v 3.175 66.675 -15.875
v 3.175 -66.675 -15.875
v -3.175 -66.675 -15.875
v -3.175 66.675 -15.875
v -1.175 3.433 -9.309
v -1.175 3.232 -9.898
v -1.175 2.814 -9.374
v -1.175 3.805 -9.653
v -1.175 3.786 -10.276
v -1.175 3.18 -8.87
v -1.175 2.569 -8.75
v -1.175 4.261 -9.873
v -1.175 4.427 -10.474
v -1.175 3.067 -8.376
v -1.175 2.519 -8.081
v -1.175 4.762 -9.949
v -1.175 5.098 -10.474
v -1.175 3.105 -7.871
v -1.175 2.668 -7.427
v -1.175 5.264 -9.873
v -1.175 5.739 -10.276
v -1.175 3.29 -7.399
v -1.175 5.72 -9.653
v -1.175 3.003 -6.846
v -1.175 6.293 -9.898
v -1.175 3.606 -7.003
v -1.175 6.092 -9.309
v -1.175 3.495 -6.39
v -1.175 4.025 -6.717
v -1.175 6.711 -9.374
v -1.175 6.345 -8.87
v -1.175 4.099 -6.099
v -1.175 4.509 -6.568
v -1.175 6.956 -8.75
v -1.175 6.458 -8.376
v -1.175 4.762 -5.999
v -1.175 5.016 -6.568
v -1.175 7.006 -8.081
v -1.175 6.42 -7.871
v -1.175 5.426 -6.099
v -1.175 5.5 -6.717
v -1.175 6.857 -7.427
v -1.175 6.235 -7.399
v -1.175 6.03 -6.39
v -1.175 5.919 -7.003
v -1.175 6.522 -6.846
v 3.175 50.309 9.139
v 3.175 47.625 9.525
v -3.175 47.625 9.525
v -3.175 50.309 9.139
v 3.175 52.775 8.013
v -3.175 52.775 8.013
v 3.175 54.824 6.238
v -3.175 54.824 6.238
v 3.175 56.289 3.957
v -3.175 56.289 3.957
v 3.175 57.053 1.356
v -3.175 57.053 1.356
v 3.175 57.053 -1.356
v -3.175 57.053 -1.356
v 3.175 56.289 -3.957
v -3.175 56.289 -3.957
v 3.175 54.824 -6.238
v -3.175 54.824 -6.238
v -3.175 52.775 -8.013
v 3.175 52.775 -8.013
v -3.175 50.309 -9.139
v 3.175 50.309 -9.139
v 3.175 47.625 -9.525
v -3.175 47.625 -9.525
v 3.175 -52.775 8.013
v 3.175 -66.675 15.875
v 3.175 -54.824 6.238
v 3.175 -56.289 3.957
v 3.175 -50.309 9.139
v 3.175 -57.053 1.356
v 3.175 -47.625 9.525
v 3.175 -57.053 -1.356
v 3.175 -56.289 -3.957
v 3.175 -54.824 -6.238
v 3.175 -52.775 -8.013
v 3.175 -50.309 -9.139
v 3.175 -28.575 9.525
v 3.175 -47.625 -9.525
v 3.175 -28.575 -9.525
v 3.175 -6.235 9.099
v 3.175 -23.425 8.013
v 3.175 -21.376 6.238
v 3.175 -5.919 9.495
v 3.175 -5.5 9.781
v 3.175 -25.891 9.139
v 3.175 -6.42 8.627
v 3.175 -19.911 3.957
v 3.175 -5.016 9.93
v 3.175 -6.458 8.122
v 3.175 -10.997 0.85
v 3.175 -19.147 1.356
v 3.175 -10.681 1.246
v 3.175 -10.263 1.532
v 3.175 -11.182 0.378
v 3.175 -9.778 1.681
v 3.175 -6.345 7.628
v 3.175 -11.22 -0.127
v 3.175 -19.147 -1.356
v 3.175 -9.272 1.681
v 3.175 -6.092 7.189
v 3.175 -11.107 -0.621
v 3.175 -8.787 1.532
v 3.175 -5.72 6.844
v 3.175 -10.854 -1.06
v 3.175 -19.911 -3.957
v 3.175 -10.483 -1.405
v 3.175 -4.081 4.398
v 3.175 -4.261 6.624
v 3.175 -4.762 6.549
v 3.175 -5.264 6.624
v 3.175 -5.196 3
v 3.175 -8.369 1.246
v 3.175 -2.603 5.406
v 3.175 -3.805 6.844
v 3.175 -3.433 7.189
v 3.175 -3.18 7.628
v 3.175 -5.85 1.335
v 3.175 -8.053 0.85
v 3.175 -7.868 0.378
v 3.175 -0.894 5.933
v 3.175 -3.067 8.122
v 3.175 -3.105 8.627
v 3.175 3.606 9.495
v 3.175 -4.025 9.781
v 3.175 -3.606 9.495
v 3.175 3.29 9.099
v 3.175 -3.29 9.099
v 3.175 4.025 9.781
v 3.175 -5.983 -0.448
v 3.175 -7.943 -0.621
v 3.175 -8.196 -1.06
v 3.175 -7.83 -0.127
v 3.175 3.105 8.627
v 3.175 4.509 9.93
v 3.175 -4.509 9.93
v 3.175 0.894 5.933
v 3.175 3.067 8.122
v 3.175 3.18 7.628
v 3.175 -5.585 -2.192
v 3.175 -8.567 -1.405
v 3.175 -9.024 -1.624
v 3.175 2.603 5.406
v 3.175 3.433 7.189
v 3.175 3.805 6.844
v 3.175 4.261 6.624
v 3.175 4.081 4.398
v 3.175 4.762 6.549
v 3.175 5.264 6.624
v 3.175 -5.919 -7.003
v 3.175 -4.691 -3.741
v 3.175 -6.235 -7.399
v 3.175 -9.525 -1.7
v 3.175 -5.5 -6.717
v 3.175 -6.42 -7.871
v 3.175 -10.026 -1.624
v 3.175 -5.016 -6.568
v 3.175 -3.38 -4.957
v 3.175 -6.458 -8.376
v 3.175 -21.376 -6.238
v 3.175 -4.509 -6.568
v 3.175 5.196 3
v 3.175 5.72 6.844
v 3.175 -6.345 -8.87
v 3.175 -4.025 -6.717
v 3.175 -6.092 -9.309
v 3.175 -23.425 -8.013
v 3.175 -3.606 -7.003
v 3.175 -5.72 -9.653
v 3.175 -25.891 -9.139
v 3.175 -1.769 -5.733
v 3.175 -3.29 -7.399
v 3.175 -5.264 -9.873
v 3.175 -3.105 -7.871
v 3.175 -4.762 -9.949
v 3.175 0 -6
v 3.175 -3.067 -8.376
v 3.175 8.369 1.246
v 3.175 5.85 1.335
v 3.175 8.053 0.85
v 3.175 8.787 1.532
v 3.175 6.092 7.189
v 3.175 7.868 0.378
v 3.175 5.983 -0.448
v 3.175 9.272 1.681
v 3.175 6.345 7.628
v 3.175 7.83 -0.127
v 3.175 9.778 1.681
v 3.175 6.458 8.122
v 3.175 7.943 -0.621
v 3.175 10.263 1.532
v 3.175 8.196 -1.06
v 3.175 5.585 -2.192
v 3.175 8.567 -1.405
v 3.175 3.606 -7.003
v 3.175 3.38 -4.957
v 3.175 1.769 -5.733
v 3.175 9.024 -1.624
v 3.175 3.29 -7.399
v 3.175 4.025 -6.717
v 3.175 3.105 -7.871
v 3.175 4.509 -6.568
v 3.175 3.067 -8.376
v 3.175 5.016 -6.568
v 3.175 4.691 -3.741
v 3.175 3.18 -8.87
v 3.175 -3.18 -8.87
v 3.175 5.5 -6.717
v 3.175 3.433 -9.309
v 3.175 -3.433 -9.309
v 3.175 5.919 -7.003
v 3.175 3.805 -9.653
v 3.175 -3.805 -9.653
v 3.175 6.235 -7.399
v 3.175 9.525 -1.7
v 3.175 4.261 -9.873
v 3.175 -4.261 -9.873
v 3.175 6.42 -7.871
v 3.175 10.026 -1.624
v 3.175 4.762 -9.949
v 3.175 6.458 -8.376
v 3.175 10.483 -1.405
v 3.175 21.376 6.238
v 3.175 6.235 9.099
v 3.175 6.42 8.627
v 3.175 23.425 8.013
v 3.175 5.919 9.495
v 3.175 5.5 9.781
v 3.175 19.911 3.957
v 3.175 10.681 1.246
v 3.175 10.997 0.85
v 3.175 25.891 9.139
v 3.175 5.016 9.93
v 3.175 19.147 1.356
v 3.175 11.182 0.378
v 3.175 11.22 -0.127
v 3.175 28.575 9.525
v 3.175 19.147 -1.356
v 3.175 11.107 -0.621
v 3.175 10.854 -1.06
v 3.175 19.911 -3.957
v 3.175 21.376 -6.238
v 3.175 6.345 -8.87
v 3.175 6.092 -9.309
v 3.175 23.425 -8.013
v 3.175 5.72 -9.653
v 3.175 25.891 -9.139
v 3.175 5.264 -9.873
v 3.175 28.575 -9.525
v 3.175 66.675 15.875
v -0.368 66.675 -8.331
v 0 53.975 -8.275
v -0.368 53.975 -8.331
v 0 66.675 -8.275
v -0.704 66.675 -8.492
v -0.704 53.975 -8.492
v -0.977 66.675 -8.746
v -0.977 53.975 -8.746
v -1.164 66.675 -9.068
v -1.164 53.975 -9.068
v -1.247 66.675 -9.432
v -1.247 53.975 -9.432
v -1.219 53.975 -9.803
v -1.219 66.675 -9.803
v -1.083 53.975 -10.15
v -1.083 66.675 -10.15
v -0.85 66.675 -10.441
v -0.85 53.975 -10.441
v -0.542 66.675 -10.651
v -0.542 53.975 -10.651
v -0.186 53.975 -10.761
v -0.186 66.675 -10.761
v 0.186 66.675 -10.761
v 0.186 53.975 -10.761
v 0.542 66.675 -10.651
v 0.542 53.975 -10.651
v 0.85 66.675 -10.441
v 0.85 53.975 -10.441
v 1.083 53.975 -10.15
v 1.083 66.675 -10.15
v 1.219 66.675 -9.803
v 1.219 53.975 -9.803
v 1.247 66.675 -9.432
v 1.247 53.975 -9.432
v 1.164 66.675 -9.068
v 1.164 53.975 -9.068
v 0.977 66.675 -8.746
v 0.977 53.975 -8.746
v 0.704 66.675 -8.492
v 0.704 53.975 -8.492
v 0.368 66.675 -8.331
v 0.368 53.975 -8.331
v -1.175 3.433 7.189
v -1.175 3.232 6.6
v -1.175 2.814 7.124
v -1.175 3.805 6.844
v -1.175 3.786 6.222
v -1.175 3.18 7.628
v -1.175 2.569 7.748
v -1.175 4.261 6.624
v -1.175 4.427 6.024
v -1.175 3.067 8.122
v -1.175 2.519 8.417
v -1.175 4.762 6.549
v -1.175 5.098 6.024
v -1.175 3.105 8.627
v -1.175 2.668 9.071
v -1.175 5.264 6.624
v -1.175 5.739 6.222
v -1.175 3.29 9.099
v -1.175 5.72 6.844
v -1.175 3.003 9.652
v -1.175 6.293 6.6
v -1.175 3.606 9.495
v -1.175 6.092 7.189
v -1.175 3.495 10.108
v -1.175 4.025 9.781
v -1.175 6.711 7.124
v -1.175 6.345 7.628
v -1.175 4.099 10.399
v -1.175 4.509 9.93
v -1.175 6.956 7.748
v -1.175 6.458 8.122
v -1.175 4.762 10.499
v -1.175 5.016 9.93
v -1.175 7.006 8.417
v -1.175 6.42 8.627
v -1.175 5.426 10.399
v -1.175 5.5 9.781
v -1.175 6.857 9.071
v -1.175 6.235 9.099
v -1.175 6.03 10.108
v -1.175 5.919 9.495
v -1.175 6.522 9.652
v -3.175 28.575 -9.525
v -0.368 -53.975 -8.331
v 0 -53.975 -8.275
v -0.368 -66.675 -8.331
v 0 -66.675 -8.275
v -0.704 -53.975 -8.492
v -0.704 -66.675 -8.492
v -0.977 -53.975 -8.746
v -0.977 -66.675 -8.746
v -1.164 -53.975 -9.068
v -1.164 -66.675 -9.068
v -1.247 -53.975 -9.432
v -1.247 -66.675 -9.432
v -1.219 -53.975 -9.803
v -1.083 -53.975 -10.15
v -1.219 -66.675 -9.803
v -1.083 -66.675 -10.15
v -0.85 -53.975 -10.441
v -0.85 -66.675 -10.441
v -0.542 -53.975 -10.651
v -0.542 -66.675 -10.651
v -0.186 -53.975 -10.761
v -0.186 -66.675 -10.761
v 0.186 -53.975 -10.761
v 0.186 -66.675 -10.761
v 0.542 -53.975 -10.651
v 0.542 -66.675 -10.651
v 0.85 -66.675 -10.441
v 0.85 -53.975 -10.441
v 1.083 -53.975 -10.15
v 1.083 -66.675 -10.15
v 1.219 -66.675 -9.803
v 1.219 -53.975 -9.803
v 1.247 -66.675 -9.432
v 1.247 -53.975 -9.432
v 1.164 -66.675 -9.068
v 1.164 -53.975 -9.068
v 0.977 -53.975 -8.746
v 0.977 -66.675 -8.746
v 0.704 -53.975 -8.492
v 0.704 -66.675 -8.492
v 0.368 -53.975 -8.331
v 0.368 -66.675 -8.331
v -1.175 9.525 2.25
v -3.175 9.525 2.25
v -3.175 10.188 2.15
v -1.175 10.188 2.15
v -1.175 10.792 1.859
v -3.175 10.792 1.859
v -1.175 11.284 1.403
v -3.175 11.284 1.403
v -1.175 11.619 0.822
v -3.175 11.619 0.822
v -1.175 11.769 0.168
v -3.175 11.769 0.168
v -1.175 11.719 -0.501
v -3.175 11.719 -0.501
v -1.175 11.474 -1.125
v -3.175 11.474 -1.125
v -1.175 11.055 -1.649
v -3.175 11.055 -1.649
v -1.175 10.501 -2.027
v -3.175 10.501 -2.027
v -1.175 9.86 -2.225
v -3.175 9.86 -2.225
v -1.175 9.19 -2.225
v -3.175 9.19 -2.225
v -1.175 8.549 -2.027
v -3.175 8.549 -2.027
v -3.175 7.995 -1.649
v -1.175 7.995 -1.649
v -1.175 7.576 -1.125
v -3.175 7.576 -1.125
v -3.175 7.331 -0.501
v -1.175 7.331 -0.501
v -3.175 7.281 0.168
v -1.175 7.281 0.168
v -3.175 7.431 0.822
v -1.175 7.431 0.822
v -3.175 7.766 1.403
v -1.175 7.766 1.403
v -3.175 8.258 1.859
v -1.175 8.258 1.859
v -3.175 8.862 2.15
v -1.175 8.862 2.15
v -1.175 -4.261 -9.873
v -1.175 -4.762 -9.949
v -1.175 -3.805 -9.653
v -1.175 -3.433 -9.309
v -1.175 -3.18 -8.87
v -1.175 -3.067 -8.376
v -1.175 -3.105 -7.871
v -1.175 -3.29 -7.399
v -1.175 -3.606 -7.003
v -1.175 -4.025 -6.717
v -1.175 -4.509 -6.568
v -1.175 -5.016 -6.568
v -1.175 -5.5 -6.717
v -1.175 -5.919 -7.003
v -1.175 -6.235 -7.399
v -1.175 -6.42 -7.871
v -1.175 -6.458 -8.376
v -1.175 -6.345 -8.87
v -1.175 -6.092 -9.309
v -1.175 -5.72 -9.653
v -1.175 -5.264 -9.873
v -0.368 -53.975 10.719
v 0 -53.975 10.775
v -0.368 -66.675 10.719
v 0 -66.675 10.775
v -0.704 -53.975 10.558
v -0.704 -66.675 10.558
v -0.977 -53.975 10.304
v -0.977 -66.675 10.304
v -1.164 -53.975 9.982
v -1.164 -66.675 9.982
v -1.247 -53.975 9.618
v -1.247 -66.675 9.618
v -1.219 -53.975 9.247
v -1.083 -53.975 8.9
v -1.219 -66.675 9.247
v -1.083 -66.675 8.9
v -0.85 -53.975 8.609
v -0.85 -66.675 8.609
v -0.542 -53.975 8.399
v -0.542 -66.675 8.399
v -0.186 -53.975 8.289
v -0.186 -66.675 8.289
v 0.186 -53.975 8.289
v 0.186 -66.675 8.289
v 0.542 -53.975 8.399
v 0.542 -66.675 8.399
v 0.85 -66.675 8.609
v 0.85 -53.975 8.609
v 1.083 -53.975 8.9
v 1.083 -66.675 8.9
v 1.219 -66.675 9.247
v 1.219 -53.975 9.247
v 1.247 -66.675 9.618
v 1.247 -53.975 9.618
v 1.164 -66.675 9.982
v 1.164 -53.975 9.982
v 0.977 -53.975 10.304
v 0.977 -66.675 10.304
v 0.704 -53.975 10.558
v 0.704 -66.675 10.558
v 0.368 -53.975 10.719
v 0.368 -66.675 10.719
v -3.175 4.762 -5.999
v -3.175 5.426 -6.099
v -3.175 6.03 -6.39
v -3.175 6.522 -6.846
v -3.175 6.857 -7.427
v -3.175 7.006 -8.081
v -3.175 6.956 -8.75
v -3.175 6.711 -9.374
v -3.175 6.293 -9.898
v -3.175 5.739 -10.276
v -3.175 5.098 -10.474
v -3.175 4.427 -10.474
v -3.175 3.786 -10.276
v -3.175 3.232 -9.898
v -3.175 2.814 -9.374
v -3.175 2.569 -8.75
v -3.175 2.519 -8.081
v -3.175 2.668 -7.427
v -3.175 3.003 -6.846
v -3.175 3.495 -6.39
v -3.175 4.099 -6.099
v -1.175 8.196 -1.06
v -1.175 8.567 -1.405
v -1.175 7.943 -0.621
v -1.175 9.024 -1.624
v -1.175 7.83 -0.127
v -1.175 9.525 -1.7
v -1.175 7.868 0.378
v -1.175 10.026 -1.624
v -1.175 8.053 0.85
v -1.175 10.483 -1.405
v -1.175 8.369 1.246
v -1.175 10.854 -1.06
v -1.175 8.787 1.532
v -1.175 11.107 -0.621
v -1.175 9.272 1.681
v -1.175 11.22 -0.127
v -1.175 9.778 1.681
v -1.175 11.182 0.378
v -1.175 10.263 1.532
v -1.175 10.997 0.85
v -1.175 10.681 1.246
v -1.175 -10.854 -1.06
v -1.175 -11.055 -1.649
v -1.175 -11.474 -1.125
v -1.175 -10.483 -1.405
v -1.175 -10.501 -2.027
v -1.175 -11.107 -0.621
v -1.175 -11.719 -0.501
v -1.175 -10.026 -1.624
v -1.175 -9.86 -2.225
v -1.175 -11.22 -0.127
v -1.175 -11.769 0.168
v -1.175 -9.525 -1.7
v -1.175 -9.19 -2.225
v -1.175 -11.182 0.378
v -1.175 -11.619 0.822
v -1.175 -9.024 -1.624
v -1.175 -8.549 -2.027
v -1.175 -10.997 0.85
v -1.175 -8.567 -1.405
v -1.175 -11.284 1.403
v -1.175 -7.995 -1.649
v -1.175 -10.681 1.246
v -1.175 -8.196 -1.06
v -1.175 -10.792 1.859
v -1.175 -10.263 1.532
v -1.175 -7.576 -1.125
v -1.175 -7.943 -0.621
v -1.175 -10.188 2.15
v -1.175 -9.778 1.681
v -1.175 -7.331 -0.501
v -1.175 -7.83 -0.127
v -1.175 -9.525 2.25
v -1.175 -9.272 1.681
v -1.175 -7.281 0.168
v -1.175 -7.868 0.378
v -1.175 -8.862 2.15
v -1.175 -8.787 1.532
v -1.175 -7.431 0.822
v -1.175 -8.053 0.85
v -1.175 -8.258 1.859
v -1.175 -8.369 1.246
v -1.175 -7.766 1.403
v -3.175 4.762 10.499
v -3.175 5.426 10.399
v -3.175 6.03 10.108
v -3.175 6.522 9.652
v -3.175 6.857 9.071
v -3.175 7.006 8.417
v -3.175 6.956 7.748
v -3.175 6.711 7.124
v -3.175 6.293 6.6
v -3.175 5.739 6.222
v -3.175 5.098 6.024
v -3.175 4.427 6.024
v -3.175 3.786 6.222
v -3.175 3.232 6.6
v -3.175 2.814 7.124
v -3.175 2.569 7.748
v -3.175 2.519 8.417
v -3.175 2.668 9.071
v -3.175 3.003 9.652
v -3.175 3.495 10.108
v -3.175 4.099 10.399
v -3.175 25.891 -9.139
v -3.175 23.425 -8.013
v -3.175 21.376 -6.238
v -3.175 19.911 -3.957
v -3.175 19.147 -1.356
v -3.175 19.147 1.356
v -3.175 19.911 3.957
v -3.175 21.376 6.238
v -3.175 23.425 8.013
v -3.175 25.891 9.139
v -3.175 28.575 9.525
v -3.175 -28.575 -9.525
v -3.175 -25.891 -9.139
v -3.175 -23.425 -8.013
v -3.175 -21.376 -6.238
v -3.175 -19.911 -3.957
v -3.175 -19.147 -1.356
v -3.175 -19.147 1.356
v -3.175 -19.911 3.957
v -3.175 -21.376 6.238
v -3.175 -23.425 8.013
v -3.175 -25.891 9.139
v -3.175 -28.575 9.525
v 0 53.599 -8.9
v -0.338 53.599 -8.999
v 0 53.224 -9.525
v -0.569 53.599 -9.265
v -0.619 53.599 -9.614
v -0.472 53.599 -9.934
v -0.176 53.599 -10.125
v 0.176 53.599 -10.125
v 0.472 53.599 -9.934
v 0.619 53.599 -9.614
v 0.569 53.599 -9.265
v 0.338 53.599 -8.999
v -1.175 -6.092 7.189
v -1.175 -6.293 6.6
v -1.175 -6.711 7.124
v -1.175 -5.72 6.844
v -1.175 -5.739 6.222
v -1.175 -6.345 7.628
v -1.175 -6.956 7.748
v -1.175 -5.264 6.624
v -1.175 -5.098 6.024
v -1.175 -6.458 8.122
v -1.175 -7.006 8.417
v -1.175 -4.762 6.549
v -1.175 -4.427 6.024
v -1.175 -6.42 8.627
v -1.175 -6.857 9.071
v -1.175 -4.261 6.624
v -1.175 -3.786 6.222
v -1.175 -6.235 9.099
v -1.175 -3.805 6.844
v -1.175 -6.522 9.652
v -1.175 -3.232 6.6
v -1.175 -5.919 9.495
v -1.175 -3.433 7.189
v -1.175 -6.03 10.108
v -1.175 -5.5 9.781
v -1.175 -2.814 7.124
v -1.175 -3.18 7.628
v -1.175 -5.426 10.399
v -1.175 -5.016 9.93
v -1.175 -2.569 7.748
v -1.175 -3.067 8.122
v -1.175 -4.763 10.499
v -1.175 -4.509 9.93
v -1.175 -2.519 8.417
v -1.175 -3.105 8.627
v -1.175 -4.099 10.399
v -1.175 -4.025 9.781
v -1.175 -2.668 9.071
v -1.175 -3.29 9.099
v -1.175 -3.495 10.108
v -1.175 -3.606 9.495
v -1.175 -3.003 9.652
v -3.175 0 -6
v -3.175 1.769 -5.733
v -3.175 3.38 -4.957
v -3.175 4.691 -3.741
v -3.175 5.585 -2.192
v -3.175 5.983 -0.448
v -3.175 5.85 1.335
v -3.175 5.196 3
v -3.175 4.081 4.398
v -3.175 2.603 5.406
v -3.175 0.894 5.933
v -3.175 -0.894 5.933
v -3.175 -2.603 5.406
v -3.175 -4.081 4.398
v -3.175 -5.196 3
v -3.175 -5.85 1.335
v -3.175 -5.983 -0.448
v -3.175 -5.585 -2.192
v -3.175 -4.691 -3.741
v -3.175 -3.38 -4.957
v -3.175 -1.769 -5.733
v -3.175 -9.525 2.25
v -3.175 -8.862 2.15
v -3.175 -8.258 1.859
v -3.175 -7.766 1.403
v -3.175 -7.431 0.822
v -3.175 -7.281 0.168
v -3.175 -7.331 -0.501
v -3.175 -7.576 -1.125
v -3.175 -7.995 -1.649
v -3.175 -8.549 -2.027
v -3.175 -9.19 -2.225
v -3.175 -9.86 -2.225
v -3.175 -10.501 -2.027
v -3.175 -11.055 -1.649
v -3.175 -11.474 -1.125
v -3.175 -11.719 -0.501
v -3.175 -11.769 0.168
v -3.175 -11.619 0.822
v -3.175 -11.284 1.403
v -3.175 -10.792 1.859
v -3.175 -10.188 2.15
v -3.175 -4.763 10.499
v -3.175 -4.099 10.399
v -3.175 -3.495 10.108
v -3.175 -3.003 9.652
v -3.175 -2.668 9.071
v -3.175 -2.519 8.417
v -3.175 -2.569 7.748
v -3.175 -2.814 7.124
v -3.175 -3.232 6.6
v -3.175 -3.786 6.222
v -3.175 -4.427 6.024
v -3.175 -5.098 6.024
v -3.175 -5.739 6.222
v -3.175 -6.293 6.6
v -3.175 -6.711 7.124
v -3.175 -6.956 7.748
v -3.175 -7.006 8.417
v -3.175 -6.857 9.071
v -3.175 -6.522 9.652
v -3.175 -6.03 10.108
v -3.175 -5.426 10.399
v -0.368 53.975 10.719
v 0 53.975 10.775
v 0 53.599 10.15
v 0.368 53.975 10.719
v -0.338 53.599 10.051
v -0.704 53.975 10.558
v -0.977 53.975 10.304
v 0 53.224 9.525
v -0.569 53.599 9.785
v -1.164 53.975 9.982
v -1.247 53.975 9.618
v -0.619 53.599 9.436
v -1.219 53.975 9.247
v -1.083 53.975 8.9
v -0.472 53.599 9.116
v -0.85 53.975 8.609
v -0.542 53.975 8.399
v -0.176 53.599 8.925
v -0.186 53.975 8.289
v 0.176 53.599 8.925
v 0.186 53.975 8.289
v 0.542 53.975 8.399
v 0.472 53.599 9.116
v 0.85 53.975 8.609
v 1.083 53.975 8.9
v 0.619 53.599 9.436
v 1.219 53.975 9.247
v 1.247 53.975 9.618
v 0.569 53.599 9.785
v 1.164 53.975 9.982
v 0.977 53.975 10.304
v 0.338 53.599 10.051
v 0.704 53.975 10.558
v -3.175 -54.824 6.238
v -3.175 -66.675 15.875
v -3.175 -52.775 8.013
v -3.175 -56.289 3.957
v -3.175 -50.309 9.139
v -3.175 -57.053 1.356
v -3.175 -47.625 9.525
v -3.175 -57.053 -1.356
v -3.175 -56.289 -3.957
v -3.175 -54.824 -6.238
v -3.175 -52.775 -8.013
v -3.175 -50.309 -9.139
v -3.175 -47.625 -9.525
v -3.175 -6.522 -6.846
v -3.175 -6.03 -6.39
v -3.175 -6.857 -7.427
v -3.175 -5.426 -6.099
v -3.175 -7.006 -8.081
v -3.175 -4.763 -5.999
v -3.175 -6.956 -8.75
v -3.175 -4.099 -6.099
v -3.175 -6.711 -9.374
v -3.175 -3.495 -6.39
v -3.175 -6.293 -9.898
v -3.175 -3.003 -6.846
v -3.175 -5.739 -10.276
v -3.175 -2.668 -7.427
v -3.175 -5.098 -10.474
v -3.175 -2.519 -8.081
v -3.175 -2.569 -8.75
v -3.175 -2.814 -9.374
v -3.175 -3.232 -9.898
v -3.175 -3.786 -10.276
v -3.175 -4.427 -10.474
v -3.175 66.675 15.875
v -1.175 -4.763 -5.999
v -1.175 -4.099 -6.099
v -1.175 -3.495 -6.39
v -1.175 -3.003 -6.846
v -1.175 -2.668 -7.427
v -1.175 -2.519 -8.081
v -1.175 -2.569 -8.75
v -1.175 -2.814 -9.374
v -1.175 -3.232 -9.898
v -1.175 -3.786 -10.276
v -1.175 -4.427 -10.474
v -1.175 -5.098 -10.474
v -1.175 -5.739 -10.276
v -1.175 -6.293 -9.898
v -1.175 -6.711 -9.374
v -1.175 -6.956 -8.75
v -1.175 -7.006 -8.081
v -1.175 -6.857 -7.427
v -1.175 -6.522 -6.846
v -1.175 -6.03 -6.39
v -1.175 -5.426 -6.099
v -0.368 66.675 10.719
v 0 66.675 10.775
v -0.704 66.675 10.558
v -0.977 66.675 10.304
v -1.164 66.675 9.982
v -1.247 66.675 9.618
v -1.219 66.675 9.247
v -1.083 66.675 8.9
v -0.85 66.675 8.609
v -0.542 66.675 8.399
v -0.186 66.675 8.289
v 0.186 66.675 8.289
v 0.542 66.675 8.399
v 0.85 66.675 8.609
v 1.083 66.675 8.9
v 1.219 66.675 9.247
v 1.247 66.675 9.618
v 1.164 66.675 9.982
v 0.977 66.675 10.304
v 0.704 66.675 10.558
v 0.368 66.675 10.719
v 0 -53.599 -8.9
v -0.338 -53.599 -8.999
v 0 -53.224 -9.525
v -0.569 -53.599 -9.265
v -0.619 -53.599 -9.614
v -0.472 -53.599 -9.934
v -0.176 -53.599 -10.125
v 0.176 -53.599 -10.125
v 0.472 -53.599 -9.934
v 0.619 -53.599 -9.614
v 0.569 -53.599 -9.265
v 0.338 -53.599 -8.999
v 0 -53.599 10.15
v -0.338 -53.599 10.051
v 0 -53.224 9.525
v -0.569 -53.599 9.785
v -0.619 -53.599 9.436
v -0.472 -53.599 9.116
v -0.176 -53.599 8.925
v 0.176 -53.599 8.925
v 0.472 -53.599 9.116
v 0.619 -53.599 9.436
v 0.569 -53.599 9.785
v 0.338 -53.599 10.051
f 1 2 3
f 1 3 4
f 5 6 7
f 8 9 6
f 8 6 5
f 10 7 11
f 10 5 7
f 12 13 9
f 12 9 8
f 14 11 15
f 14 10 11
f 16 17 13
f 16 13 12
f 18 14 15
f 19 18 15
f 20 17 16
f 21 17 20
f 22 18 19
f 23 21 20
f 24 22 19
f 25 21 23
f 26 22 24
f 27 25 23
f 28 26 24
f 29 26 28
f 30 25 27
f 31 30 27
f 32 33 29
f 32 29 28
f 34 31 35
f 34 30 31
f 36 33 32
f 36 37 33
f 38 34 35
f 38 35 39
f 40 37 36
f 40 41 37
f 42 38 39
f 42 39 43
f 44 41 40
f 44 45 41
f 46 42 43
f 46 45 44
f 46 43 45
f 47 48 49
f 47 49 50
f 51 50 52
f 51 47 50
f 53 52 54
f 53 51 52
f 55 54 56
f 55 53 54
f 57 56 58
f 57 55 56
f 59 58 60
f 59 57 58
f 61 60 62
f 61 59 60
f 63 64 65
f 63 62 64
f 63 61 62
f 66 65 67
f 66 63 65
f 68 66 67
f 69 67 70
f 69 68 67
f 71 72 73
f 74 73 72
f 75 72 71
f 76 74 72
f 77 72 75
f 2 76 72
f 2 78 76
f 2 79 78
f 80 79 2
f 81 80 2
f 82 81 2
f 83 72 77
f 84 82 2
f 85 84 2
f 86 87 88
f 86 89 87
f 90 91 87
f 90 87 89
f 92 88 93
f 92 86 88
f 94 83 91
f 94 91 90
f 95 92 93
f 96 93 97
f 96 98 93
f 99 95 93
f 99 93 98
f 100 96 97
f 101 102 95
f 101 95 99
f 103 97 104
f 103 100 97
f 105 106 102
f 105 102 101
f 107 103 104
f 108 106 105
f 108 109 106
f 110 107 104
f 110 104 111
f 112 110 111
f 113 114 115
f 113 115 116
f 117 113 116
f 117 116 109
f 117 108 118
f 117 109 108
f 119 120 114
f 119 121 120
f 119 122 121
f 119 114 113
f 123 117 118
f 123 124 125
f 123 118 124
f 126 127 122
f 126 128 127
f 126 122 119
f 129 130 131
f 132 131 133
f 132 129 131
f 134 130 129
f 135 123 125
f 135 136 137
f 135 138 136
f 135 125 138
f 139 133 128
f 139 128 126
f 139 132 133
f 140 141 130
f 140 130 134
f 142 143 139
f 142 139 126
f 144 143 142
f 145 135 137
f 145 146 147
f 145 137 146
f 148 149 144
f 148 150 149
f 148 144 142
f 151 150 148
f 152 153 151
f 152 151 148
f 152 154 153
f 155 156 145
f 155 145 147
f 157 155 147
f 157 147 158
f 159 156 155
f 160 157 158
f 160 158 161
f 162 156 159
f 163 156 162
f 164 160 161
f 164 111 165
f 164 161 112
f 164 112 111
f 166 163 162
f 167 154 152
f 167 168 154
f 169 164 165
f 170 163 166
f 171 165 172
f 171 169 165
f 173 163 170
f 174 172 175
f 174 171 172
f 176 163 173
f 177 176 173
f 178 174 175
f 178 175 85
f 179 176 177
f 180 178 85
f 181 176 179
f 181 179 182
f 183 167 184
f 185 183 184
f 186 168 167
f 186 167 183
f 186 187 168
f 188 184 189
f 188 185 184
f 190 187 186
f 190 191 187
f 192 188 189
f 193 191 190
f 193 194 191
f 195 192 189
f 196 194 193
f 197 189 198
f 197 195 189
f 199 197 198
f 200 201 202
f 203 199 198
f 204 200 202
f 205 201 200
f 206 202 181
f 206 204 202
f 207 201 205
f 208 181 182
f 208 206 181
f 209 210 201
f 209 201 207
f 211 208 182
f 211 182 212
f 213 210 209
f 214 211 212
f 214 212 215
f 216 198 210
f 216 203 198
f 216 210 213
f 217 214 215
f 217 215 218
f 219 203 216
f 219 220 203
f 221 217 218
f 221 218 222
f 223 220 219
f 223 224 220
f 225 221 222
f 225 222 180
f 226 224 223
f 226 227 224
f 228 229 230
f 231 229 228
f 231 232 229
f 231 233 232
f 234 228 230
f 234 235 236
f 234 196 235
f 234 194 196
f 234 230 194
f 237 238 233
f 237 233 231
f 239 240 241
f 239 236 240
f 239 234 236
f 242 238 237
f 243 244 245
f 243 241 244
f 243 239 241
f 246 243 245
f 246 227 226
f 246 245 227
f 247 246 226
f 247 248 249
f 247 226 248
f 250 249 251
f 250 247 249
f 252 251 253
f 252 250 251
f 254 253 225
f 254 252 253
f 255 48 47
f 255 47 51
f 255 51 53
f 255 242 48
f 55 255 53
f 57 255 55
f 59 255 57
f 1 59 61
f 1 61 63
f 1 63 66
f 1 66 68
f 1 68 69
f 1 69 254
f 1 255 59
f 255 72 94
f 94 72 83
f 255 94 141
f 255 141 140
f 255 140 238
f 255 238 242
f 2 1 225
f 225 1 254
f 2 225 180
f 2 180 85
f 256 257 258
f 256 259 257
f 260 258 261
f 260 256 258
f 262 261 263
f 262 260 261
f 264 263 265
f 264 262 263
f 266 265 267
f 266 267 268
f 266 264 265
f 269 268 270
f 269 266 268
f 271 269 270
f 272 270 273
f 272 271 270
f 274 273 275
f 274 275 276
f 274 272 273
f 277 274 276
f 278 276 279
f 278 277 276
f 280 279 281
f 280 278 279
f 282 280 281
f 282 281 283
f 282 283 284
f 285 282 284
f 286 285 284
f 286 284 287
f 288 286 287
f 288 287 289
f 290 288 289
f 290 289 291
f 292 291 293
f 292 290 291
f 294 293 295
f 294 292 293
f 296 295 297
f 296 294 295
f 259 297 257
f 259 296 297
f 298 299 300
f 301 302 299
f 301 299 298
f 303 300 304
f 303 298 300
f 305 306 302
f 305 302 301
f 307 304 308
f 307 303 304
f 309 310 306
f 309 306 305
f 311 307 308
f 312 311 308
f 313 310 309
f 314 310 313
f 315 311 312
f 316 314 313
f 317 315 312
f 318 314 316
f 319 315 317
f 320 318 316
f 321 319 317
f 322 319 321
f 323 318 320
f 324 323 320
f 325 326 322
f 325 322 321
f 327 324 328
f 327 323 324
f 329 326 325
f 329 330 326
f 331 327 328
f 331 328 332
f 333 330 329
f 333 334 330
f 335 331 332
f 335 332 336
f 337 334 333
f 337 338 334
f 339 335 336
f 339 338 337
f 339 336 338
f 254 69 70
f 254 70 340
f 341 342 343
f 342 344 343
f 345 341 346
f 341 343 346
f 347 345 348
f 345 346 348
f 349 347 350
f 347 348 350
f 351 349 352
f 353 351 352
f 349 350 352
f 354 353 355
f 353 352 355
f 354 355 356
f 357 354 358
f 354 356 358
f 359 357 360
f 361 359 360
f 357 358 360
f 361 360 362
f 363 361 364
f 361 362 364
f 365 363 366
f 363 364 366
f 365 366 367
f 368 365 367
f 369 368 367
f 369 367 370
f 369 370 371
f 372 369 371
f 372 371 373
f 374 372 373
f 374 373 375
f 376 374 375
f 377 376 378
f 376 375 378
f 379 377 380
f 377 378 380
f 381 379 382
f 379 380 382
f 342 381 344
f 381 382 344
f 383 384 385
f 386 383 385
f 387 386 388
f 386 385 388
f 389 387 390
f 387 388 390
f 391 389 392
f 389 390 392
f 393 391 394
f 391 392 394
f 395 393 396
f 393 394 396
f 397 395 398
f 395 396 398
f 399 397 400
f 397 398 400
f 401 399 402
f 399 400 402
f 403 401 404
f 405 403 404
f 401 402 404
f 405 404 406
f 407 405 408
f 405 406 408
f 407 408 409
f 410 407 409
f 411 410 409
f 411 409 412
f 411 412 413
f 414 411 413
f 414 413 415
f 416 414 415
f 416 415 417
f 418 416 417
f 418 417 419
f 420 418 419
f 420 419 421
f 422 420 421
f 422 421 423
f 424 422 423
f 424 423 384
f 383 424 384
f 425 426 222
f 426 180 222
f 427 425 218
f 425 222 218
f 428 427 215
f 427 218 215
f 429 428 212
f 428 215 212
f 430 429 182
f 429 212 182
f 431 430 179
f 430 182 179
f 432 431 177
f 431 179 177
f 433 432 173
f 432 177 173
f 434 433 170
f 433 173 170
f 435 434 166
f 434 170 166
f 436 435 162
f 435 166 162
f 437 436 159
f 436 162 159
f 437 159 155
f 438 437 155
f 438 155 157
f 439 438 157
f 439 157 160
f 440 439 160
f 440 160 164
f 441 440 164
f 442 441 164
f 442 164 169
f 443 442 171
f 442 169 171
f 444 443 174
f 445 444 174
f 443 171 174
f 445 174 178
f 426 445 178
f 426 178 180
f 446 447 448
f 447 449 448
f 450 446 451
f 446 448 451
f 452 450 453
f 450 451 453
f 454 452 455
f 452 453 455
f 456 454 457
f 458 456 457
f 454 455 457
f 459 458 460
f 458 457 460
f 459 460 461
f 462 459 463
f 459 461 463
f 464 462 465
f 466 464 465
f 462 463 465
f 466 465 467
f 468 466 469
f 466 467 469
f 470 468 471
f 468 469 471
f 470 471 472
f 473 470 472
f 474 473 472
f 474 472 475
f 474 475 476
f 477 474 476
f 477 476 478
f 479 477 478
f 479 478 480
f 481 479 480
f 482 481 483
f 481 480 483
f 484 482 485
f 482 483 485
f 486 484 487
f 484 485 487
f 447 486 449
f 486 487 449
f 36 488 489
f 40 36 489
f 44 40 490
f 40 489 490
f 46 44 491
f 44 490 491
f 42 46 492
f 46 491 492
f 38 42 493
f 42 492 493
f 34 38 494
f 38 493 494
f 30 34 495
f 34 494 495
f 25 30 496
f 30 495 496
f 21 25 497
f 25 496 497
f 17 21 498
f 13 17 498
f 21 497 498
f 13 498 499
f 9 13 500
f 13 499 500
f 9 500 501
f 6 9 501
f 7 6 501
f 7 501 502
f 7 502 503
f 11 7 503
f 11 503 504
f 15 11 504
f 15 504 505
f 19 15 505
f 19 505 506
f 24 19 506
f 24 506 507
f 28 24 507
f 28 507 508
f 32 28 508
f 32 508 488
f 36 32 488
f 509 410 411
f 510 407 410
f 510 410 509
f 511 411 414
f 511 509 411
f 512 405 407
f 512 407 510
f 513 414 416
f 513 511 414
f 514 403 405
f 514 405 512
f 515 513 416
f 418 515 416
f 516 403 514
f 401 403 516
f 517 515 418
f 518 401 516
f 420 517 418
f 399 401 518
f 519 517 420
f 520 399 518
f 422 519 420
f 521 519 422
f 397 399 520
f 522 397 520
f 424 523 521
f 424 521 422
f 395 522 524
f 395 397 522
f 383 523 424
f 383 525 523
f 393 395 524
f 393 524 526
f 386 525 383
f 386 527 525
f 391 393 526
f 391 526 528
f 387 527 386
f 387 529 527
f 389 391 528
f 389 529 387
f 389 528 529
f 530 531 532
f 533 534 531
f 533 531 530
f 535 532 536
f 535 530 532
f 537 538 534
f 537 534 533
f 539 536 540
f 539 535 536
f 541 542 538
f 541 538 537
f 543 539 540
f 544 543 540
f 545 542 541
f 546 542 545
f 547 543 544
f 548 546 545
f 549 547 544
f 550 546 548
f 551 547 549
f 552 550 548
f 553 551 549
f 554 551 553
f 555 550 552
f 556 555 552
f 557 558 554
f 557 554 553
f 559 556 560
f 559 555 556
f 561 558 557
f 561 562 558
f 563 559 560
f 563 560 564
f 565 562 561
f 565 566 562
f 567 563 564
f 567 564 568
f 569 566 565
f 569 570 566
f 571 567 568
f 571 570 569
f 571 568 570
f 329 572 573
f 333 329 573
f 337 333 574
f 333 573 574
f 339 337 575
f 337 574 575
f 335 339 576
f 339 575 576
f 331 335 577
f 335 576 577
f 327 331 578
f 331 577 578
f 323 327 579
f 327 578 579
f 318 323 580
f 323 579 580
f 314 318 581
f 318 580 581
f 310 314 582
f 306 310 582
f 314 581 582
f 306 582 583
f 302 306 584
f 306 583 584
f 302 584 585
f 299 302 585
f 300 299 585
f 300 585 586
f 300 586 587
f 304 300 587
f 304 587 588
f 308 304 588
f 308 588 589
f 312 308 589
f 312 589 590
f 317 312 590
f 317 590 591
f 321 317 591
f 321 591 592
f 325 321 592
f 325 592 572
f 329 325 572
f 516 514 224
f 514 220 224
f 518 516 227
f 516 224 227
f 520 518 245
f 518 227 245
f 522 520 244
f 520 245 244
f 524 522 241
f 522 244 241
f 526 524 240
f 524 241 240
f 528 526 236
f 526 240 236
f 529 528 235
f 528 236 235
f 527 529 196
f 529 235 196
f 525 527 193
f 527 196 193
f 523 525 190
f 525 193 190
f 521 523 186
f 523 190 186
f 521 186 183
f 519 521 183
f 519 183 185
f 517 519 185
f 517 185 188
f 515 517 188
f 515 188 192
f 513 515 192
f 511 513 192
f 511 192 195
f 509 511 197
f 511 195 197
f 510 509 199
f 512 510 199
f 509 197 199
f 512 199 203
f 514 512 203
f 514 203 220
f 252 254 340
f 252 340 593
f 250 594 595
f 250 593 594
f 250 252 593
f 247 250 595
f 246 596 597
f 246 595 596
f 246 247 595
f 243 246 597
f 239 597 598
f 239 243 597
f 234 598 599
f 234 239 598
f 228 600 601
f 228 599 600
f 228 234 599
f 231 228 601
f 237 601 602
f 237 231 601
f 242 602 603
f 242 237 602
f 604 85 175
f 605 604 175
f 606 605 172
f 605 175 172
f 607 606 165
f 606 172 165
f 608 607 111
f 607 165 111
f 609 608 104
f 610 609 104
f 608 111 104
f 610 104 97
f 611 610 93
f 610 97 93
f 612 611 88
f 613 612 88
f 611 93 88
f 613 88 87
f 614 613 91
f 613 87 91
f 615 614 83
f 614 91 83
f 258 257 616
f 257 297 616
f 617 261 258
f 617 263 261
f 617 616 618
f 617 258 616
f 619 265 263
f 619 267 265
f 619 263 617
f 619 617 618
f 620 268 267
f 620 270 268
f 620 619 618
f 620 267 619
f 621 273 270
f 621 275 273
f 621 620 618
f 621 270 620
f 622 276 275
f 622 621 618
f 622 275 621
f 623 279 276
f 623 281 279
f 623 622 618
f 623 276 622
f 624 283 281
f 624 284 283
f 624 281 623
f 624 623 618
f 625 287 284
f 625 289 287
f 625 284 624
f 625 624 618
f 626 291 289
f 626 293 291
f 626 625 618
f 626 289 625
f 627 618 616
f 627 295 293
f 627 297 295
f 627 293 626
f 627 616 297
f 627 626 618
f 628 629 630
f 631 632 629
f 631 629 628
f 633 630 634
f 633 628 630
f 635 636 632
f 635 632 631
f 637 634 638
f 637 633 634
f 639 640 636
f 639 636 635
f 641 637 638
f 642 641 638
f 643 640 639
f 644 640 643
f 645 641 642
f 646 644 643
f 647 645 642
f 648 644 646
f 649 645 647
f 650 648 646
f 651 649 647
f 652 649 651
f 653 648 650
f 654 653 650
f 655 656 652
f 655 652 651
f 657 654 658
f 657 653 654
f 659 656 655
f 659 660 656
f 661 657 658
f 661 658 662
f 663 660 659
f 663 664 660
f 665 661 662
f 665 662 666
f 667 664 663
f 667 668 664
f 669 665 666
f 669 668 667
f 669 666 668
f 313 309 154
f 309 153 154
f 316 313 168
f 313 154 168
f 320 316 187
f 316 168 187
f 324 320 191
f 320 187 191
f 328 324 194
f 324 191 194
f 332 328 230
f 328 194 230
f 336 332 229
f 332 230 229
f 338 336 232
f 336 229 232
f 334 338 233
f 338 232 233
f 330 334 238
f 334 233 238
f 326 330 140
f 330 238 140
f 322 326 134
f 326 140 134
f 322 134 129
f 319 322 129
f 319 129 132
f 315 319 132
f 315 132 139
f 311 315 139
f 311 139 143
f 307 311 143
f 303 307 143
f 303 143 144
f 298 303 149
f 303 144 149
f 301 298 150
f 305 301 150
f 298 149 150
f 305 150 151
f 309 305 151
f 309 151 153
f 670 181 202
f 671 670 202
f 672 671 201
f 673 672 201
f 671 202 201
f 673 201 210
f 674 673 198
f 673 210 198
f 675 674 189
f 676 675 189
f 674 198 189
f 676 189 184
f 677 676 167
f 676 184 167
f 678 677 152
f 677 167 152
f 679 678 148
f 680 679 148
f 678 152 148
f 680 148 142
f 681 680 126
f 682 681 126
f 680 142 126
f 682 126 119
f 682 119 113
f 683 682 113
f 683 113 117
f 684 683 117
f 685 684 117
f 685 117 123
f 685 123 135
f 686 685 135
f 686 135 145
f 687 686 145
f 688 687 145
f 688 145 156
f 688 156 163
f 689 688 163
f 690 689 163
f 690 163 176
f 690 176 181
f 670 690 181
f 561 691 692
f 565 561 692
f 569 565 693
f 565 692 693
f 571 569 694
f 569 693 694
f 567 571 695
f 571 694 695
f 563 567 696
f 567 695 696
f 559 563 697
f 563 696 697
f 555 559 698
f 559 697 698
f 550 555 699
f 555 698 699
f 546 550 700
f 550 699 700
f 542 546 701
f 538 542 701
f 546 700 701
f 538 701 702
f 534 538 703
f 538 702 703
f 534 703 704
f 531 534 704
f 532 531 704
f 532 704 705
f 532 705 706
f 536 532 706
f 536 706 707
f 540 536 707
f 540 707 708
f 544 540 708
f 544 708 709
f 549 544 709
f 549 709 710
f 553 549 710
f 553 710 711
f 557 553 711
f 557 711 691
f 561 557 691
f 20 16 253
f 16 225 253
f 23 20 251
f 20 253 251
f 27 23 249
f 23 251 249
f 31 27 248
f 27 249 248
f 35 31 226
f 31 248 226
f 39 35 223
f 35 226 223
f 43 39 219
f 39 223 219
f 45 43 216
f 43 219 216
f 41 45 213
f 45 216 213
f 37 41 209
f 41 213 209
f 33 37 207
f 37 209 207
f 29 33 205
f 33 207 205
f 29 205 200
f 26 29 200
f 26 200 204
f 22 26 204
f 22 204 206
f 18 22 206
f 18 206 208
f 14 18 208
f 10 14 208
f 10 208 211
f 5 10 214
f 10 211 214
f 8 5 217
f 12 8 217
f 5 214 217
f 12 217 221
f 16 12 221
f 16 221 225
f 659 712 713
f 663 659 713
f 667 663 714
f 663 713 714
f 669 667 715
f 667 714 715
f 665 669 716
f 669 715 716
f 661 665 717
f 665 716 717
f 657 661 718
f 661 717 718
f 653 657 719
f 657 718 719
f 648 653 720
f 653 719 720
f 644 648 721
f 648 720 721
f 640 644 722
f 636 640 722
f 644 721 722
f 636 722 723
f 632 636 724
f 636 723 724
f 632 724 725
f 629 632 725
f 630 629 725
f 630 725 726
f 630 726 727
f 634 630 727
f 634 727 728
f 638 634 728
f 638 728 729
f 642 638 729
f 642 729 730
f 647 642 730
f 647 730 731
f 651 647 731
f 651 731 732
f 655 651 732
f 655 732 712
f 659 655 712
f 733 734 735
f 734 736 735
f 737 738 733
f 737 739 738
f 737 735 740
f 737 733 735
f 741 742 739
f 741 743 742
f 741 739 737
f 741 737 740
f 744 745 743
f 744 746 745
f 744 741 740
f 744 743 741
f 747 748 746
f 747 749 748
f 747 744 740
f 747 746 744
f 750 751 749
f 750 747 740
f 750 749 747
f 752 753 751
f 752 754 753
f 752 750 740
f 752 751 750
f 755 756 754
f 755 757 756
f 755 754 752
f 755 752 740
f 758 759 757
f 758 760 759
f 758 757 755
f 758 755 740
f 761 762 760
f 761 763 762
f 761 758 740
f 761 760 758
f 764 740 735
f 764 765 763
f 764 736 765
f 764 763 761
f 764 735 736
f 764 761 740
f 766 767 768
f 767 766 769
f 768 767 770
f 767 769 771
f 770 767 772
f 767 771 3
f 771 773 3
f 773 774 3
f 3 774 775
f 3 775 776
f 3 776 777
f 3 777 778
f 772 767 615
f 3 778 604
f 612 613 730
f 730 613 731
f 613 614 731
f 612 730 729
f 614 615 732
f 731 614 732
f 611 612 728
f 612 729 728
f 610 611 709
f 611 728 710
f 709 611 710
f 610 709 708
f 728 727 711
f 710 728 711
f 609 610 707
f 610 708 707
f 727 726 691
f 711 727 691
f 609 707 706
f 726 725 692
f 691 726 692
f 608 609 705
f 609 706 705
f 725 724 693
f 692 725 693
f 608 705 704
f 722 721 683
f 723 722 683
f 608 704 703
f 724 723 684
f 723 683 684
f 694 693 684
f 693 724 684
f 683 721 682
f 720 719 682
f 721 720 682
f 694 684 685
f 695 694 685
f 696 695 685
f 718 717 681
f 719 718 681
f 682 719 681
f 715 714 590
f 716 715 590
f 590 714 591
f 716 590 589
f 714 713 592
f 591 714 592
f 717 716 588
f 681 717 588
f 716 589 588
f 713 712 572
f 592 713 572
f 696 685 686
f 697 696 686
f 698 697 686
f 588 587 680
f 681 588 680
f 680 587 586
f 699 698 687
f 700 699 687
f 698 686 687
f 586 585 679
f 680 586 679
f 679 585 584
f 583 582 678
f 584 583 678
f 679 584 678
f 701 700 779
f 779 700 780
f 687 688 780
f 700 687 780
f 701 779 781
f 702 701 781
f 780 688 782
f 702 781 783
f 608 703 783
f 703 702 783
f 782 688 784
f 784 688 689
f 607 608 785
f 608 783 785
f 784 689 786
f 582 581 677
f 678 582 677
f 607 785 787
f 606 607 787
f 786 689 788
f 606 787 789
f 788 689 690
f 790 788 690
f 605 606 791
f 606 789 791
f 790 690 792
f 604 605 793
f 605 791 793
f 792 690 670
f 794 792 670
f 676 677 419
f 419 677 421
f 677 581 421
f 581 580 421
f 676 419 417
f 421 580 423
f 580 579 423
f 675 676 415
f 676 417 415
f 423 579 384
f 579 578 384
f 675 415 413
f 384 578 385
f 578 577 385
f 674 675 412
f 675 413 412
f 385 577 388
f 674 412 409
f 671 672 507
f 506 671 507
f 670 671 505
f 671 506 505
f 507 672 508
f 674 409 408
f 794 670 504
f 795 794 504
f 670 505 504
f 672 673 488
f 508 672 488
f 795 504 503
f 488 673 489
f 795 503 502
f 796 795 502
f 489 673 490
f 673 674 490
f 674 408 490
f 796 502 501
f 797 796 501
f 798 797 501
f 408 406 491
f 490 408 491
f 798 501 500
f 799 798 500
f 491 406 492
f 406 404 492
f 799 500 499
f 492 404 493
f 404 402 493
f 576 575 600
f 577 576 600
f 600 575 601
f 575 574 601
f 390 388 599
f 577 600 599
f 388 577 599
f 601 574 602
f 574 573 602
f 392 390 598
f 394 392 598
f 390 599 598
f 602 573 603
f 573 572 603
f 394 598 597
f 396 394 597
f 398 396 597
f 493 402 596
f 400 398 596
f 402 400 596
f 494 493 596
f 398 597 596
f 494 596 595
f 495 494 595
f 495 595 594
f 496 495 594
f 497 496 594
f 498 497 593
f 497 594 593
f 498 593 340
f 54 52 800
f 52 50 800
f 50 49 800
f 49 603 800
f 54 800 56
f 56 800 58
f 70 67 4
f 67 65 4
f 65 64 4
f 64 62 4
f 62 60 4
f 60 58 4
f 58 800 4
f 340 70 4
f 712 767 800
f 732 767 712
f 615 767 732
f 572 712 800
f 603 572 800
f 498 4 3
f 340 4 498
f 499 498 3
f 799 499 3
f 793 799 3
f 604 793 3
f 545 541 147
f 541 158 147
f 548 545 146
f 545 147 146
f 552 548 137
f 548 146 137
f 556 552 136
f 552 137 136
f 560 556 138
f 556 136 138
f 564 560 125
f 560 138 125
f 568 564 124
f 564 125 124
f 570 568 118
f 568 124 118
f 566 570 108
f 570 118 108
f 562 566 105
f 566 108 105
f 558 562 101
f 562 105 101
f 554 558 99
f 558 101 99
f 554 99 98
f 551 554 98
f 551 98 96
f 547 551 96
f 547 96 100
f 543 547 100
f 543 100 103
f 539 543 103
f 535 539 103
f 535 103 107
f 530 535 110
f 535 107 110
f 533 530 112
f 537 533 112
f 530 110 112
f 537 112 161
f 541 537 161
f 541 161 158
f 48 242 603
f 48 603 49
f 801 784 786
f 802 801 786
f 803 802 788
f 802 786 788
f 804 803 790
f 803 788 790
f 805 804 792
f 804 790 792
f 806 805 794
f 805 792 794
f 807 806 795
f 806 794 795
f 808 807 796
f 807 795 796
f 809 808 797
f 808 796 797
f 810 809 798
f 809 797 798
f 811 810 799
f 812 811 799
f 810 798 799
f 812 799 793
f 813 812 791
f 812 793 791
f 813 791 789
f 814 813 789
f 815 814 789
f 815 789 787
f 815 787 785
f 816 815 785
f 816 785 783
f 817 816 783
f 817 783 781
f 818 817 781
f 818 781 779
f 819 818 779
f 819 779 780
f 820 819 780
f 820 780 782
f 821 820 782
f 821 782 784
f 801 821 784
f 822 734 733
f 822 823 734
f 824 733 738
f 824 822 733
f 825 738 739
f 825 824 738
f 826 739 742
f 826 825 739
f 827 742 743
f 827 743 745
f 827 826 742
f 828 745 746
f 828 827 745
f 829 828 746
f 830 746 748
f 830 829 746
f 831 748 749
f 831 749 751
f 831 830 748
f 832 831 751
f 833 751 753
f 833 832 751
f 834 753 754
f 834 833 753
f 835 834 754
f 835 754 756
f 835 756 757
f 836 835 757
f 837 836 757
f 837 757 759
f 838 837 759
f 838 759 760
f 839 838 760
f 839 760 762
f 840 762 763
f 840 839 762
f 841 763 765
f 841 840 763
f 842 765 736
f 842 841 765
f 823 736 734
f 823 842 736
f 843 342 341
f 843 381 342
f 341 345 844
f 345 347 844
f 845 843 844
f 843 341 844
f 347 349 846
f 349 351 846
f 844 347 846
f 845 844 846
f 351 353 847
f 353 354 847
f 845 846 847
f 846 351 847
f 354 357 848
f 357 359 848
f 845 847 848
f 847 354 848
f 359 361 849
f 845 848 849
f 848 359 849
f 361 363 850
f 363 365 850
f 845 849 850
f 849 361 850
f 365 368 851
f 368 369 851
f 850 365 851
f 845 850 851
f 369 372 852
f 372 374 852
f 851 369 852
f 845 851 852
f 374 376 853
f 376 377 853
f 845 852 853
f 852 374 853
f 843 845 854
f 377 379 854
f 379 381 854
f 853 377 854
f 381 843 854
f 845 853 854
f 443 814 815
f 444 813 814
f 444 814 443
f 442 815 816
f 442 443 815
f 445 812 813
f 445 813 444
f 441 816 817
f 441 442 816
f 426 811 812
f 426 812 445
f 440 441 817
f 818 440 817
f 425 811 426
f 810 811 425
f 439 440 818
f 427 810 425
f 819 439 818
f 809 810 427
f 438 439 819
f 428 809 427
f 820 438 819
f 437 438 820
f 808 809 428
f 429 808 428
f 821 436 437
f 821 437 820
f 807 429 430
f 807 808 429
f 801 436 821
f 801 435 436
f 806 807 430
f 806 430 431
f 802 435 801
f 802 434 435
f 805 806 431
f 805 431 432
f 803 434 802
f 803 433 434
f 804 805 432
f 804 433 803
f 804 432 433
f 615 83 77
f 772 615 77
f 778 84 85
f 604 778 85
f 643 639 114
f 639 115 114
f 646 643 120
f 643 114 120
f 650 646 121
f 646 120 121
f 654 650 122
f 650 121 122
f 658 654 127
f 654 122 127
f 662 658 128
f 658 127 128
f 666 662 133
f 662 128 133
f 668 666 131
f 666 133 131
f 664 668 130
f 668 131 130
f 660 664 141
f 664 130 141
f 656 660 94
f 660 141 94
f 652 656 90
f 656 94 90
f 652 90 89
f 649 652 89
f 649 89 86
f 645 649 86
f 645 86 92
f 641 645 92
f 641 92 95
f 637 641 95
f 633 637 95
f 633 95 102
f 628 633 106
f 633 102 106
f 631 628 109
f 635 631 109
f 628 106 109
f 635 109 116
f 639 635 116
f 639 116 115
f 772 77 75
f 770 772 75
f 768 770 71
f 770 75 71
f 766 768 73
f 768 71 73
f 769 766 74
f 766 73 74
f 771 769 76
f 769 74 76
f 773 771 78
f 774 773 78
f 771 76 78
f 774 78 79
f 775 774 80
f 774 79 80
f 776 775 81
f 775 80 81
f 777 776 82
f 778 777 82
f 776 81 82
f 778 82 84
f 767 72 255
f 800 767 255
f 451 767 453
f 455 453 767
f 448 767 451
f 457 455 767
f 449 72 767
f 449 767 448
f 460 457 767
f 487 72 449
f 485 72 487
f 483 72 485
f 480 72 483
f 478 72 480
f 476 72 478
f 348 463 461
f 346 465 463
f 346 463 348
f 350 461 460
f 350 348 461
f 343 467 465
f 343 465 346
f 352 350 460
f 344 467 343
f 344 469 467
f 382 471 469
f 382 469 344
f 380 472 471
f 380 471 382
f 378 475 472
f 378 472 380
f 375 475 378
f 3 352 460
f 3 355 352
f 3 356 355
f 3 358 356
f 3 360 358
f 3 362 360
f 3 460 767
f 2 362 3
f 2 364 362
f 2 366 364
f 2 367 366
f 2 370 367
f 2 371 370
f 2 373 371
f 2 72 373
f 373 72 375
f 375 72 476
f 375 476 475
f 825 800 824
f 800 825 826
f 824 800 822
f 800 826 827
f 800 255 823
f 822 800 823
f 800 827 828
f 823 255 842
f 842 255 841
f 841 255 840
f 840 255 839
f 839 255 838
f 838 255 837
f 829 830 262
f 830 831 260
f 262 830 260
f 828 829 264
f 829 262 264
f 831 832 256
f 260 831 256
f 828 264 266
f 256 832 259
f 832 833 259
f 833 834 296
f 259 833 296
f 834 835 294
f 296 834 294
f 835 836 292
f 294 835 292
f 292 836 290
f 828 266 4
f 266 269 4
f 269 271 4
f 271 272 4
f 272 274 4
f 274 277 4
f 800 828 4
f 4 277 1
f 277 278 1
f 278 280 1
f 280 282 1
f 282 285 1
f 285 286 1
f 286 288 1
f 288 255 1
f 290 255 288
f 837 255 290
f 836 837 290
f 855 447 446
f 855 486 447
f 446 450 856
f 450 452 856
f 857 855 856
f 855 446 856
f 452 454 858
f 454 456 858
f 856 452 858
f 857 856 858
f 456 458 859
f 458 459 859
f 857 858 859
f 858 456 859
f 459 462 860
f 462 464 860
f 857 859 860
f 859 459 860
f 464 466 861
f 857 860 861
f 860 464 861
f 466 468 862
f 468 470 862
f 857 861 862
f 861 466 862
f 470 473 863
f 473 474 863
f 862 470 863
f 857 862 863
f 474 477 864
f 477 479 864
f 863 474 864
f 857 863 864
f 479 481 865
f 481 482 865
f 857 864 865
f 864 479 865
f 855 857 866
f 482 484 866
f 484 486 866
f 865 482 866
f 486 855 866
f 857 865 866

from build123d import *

# Parameters (mm, degrees)
SKETCH1_W                      = 31.75
SKETCH1_H                      = 133.35
BOSS_EXTRUDE1_DEPTH            = 3.175
M3X0_5_TAPPED_HOLE1_AT_2_COUNT = 2
M3X0_5_TAPPED_HOLE1_AT_2_PITCH = 19.05
F_12_0MM_DOWEL_HOLE1_D         = 12
CBORE_FOR_M3_SHCS1_D           = 3.4
CBORE_FOR_M3_SHCS1_DEPTH       = 11.678536948
CBORE_FOR_M3_SHCS1_CBORE_D     = 4.5
CBORE_FOR_M3_SHCS1_CBORE_DEPTH = 2
CBORE_FOR_M3_SHCS1_TIP         = 1.021463052
CUT_EXTRUDE1_DEPTH             = 69.832359759


with BuildPart() as part:
    # Sketch1 → Boss-Extrude1 (new, symmetric)
    with BuildSketch(Plane(origin=(0, 0, 0), x_dir=(0, 0, -1), z_dir=(1, 0, 0))):
        Rectangle(SKETCH1_W, SKETCH1_H)
    extrude(amount=BOSS_EXTRUDE1_DEPTH, both=True)

    # Sketch5 → M3x0.5 Tapped Hole1 (revolve, cut)
    with BuildSketch(Plane(origin=(0, 66.675, -9.525), x_dir=(0, 0, 1), z_dir=(1, 0, 0))):
        Polygon((0, 0), (0, 13.451075774), (1.25, 12.7), (1.25, 0), align=None)
    m3x0_5_tapped_hole1 = revolve(axis=Axis((0, 73.025, -9.525), (0, -1, 0)), mode=Mode.SUBTRACT)

    # M3x0.5 Tapped Hole1 at 2: M3x0.5 Tapped Hole1 ×2
    with Locations(*[(0, 0, i * M3X0_5_TAPPED_HOLE1_AT_2_PITCH) for i in range(1, M3X0_5_TAPPED_HOLE1_AT_2_COUNT)]):
        add(m3x0_5_tapped_hole1, mode=Mode.SUBTRACT)

    # Mirror1: M3x0.5 Tapped Hole1 across plane
    add(m3x0_5_tapped_hole1.mirror(Plane.ZX), mode=Mode.SUBTRACT)

    # Mirror1 copy 1 sketch → Mirror1 copy 1 (revolve, cut)
    with BuildSketch(Plane(origin=(0, -66.675, 9.525), x_dir=(0, 0, 1), z_dir=(1, 0, 0))):
        Polygon((0, 0), (0, -13.451075774), (1.25, -12.7), (1.25, 0), align=None)
    revolve(axis=Axis((0, -73.025, 9.525), (0, -1, 0)), mode=Mode.SUBTRACT)

    # Ø12.0mm Dowel Hole1 (through all)
    with Locations(Plane.ZY.offset(3.175)):
        with Locations((0, 0)):
            Hole(F_12_0MM_DOWEL_HOLE1_D / 2)

    # CBORE for M3 SHCS1
    with Locations(Plane.ZY.offset(3.175)):
        with Locations((8.248891971, -4.7625), (8.248891971, 4.7625), (0, 9.525), (-8.248891971, 4.7625), (-8.248891971, -4.7625), (0, -9.525)):
            CounterBoreHole(CBORE_FOR_M3_SHCS1_D / 2, CBORE_FOR_M3_SHCS1_CBORE_D / 2, CBORE_FOR_M3_SHCS1_CBORE_DEPTH, depth=CBORE_FOR_M3_SHCS1_DEPTH)
            with Locations((0, 0, -(CBORE_FOR_M3_SHCS1_DEPTH + CBORE_FOR_M3_SHCS1_TIP / 2))):  # 118° drill point
                Cone(0, CBORE_FOR_M3_SHCS1_D / 2, CBORE_FOR_M3_SHCS1_TIP, mode=Mode.SUBTRACT)

    # Sketch12 → Cut-Extrude1 (cut, through all)
    with BuildSketch(Plane(origin=(3.175, 0, 0), x_dir=(0, 0, -1), z_dir=(1, 0, 0))):
        with BuildLine():
            Line((-9.525, -28.575), (-9.525, -47.625))
            ThreePointArc((-9.525, -47.625), (0, -57.15), (9.525, -47.625))
            Line((9.525, -47.625), (9.525, -28.575))
            ThreePointArc((9.525, -28.575), (0, -19.05), (-9.525, -28.575))
        make_face()
        with BuildLine():
            Line((9.525, 47.625), (9.525, 28.575))
            ThreePointArc((9.525, 28.575), (0, 19.05), (-9.525, 28.575))
            Line((-9.525, 28.575), (-9.525, 47.625))
            ThreePointArc((-9.525, 47.625), (0, 57.15), (9.525, 47.625))
        make_face()
    extrude(amount=-CUT_EXTRUDE1_DEPTH, mode=Mode.SUBTRACT)


solid = part.part
